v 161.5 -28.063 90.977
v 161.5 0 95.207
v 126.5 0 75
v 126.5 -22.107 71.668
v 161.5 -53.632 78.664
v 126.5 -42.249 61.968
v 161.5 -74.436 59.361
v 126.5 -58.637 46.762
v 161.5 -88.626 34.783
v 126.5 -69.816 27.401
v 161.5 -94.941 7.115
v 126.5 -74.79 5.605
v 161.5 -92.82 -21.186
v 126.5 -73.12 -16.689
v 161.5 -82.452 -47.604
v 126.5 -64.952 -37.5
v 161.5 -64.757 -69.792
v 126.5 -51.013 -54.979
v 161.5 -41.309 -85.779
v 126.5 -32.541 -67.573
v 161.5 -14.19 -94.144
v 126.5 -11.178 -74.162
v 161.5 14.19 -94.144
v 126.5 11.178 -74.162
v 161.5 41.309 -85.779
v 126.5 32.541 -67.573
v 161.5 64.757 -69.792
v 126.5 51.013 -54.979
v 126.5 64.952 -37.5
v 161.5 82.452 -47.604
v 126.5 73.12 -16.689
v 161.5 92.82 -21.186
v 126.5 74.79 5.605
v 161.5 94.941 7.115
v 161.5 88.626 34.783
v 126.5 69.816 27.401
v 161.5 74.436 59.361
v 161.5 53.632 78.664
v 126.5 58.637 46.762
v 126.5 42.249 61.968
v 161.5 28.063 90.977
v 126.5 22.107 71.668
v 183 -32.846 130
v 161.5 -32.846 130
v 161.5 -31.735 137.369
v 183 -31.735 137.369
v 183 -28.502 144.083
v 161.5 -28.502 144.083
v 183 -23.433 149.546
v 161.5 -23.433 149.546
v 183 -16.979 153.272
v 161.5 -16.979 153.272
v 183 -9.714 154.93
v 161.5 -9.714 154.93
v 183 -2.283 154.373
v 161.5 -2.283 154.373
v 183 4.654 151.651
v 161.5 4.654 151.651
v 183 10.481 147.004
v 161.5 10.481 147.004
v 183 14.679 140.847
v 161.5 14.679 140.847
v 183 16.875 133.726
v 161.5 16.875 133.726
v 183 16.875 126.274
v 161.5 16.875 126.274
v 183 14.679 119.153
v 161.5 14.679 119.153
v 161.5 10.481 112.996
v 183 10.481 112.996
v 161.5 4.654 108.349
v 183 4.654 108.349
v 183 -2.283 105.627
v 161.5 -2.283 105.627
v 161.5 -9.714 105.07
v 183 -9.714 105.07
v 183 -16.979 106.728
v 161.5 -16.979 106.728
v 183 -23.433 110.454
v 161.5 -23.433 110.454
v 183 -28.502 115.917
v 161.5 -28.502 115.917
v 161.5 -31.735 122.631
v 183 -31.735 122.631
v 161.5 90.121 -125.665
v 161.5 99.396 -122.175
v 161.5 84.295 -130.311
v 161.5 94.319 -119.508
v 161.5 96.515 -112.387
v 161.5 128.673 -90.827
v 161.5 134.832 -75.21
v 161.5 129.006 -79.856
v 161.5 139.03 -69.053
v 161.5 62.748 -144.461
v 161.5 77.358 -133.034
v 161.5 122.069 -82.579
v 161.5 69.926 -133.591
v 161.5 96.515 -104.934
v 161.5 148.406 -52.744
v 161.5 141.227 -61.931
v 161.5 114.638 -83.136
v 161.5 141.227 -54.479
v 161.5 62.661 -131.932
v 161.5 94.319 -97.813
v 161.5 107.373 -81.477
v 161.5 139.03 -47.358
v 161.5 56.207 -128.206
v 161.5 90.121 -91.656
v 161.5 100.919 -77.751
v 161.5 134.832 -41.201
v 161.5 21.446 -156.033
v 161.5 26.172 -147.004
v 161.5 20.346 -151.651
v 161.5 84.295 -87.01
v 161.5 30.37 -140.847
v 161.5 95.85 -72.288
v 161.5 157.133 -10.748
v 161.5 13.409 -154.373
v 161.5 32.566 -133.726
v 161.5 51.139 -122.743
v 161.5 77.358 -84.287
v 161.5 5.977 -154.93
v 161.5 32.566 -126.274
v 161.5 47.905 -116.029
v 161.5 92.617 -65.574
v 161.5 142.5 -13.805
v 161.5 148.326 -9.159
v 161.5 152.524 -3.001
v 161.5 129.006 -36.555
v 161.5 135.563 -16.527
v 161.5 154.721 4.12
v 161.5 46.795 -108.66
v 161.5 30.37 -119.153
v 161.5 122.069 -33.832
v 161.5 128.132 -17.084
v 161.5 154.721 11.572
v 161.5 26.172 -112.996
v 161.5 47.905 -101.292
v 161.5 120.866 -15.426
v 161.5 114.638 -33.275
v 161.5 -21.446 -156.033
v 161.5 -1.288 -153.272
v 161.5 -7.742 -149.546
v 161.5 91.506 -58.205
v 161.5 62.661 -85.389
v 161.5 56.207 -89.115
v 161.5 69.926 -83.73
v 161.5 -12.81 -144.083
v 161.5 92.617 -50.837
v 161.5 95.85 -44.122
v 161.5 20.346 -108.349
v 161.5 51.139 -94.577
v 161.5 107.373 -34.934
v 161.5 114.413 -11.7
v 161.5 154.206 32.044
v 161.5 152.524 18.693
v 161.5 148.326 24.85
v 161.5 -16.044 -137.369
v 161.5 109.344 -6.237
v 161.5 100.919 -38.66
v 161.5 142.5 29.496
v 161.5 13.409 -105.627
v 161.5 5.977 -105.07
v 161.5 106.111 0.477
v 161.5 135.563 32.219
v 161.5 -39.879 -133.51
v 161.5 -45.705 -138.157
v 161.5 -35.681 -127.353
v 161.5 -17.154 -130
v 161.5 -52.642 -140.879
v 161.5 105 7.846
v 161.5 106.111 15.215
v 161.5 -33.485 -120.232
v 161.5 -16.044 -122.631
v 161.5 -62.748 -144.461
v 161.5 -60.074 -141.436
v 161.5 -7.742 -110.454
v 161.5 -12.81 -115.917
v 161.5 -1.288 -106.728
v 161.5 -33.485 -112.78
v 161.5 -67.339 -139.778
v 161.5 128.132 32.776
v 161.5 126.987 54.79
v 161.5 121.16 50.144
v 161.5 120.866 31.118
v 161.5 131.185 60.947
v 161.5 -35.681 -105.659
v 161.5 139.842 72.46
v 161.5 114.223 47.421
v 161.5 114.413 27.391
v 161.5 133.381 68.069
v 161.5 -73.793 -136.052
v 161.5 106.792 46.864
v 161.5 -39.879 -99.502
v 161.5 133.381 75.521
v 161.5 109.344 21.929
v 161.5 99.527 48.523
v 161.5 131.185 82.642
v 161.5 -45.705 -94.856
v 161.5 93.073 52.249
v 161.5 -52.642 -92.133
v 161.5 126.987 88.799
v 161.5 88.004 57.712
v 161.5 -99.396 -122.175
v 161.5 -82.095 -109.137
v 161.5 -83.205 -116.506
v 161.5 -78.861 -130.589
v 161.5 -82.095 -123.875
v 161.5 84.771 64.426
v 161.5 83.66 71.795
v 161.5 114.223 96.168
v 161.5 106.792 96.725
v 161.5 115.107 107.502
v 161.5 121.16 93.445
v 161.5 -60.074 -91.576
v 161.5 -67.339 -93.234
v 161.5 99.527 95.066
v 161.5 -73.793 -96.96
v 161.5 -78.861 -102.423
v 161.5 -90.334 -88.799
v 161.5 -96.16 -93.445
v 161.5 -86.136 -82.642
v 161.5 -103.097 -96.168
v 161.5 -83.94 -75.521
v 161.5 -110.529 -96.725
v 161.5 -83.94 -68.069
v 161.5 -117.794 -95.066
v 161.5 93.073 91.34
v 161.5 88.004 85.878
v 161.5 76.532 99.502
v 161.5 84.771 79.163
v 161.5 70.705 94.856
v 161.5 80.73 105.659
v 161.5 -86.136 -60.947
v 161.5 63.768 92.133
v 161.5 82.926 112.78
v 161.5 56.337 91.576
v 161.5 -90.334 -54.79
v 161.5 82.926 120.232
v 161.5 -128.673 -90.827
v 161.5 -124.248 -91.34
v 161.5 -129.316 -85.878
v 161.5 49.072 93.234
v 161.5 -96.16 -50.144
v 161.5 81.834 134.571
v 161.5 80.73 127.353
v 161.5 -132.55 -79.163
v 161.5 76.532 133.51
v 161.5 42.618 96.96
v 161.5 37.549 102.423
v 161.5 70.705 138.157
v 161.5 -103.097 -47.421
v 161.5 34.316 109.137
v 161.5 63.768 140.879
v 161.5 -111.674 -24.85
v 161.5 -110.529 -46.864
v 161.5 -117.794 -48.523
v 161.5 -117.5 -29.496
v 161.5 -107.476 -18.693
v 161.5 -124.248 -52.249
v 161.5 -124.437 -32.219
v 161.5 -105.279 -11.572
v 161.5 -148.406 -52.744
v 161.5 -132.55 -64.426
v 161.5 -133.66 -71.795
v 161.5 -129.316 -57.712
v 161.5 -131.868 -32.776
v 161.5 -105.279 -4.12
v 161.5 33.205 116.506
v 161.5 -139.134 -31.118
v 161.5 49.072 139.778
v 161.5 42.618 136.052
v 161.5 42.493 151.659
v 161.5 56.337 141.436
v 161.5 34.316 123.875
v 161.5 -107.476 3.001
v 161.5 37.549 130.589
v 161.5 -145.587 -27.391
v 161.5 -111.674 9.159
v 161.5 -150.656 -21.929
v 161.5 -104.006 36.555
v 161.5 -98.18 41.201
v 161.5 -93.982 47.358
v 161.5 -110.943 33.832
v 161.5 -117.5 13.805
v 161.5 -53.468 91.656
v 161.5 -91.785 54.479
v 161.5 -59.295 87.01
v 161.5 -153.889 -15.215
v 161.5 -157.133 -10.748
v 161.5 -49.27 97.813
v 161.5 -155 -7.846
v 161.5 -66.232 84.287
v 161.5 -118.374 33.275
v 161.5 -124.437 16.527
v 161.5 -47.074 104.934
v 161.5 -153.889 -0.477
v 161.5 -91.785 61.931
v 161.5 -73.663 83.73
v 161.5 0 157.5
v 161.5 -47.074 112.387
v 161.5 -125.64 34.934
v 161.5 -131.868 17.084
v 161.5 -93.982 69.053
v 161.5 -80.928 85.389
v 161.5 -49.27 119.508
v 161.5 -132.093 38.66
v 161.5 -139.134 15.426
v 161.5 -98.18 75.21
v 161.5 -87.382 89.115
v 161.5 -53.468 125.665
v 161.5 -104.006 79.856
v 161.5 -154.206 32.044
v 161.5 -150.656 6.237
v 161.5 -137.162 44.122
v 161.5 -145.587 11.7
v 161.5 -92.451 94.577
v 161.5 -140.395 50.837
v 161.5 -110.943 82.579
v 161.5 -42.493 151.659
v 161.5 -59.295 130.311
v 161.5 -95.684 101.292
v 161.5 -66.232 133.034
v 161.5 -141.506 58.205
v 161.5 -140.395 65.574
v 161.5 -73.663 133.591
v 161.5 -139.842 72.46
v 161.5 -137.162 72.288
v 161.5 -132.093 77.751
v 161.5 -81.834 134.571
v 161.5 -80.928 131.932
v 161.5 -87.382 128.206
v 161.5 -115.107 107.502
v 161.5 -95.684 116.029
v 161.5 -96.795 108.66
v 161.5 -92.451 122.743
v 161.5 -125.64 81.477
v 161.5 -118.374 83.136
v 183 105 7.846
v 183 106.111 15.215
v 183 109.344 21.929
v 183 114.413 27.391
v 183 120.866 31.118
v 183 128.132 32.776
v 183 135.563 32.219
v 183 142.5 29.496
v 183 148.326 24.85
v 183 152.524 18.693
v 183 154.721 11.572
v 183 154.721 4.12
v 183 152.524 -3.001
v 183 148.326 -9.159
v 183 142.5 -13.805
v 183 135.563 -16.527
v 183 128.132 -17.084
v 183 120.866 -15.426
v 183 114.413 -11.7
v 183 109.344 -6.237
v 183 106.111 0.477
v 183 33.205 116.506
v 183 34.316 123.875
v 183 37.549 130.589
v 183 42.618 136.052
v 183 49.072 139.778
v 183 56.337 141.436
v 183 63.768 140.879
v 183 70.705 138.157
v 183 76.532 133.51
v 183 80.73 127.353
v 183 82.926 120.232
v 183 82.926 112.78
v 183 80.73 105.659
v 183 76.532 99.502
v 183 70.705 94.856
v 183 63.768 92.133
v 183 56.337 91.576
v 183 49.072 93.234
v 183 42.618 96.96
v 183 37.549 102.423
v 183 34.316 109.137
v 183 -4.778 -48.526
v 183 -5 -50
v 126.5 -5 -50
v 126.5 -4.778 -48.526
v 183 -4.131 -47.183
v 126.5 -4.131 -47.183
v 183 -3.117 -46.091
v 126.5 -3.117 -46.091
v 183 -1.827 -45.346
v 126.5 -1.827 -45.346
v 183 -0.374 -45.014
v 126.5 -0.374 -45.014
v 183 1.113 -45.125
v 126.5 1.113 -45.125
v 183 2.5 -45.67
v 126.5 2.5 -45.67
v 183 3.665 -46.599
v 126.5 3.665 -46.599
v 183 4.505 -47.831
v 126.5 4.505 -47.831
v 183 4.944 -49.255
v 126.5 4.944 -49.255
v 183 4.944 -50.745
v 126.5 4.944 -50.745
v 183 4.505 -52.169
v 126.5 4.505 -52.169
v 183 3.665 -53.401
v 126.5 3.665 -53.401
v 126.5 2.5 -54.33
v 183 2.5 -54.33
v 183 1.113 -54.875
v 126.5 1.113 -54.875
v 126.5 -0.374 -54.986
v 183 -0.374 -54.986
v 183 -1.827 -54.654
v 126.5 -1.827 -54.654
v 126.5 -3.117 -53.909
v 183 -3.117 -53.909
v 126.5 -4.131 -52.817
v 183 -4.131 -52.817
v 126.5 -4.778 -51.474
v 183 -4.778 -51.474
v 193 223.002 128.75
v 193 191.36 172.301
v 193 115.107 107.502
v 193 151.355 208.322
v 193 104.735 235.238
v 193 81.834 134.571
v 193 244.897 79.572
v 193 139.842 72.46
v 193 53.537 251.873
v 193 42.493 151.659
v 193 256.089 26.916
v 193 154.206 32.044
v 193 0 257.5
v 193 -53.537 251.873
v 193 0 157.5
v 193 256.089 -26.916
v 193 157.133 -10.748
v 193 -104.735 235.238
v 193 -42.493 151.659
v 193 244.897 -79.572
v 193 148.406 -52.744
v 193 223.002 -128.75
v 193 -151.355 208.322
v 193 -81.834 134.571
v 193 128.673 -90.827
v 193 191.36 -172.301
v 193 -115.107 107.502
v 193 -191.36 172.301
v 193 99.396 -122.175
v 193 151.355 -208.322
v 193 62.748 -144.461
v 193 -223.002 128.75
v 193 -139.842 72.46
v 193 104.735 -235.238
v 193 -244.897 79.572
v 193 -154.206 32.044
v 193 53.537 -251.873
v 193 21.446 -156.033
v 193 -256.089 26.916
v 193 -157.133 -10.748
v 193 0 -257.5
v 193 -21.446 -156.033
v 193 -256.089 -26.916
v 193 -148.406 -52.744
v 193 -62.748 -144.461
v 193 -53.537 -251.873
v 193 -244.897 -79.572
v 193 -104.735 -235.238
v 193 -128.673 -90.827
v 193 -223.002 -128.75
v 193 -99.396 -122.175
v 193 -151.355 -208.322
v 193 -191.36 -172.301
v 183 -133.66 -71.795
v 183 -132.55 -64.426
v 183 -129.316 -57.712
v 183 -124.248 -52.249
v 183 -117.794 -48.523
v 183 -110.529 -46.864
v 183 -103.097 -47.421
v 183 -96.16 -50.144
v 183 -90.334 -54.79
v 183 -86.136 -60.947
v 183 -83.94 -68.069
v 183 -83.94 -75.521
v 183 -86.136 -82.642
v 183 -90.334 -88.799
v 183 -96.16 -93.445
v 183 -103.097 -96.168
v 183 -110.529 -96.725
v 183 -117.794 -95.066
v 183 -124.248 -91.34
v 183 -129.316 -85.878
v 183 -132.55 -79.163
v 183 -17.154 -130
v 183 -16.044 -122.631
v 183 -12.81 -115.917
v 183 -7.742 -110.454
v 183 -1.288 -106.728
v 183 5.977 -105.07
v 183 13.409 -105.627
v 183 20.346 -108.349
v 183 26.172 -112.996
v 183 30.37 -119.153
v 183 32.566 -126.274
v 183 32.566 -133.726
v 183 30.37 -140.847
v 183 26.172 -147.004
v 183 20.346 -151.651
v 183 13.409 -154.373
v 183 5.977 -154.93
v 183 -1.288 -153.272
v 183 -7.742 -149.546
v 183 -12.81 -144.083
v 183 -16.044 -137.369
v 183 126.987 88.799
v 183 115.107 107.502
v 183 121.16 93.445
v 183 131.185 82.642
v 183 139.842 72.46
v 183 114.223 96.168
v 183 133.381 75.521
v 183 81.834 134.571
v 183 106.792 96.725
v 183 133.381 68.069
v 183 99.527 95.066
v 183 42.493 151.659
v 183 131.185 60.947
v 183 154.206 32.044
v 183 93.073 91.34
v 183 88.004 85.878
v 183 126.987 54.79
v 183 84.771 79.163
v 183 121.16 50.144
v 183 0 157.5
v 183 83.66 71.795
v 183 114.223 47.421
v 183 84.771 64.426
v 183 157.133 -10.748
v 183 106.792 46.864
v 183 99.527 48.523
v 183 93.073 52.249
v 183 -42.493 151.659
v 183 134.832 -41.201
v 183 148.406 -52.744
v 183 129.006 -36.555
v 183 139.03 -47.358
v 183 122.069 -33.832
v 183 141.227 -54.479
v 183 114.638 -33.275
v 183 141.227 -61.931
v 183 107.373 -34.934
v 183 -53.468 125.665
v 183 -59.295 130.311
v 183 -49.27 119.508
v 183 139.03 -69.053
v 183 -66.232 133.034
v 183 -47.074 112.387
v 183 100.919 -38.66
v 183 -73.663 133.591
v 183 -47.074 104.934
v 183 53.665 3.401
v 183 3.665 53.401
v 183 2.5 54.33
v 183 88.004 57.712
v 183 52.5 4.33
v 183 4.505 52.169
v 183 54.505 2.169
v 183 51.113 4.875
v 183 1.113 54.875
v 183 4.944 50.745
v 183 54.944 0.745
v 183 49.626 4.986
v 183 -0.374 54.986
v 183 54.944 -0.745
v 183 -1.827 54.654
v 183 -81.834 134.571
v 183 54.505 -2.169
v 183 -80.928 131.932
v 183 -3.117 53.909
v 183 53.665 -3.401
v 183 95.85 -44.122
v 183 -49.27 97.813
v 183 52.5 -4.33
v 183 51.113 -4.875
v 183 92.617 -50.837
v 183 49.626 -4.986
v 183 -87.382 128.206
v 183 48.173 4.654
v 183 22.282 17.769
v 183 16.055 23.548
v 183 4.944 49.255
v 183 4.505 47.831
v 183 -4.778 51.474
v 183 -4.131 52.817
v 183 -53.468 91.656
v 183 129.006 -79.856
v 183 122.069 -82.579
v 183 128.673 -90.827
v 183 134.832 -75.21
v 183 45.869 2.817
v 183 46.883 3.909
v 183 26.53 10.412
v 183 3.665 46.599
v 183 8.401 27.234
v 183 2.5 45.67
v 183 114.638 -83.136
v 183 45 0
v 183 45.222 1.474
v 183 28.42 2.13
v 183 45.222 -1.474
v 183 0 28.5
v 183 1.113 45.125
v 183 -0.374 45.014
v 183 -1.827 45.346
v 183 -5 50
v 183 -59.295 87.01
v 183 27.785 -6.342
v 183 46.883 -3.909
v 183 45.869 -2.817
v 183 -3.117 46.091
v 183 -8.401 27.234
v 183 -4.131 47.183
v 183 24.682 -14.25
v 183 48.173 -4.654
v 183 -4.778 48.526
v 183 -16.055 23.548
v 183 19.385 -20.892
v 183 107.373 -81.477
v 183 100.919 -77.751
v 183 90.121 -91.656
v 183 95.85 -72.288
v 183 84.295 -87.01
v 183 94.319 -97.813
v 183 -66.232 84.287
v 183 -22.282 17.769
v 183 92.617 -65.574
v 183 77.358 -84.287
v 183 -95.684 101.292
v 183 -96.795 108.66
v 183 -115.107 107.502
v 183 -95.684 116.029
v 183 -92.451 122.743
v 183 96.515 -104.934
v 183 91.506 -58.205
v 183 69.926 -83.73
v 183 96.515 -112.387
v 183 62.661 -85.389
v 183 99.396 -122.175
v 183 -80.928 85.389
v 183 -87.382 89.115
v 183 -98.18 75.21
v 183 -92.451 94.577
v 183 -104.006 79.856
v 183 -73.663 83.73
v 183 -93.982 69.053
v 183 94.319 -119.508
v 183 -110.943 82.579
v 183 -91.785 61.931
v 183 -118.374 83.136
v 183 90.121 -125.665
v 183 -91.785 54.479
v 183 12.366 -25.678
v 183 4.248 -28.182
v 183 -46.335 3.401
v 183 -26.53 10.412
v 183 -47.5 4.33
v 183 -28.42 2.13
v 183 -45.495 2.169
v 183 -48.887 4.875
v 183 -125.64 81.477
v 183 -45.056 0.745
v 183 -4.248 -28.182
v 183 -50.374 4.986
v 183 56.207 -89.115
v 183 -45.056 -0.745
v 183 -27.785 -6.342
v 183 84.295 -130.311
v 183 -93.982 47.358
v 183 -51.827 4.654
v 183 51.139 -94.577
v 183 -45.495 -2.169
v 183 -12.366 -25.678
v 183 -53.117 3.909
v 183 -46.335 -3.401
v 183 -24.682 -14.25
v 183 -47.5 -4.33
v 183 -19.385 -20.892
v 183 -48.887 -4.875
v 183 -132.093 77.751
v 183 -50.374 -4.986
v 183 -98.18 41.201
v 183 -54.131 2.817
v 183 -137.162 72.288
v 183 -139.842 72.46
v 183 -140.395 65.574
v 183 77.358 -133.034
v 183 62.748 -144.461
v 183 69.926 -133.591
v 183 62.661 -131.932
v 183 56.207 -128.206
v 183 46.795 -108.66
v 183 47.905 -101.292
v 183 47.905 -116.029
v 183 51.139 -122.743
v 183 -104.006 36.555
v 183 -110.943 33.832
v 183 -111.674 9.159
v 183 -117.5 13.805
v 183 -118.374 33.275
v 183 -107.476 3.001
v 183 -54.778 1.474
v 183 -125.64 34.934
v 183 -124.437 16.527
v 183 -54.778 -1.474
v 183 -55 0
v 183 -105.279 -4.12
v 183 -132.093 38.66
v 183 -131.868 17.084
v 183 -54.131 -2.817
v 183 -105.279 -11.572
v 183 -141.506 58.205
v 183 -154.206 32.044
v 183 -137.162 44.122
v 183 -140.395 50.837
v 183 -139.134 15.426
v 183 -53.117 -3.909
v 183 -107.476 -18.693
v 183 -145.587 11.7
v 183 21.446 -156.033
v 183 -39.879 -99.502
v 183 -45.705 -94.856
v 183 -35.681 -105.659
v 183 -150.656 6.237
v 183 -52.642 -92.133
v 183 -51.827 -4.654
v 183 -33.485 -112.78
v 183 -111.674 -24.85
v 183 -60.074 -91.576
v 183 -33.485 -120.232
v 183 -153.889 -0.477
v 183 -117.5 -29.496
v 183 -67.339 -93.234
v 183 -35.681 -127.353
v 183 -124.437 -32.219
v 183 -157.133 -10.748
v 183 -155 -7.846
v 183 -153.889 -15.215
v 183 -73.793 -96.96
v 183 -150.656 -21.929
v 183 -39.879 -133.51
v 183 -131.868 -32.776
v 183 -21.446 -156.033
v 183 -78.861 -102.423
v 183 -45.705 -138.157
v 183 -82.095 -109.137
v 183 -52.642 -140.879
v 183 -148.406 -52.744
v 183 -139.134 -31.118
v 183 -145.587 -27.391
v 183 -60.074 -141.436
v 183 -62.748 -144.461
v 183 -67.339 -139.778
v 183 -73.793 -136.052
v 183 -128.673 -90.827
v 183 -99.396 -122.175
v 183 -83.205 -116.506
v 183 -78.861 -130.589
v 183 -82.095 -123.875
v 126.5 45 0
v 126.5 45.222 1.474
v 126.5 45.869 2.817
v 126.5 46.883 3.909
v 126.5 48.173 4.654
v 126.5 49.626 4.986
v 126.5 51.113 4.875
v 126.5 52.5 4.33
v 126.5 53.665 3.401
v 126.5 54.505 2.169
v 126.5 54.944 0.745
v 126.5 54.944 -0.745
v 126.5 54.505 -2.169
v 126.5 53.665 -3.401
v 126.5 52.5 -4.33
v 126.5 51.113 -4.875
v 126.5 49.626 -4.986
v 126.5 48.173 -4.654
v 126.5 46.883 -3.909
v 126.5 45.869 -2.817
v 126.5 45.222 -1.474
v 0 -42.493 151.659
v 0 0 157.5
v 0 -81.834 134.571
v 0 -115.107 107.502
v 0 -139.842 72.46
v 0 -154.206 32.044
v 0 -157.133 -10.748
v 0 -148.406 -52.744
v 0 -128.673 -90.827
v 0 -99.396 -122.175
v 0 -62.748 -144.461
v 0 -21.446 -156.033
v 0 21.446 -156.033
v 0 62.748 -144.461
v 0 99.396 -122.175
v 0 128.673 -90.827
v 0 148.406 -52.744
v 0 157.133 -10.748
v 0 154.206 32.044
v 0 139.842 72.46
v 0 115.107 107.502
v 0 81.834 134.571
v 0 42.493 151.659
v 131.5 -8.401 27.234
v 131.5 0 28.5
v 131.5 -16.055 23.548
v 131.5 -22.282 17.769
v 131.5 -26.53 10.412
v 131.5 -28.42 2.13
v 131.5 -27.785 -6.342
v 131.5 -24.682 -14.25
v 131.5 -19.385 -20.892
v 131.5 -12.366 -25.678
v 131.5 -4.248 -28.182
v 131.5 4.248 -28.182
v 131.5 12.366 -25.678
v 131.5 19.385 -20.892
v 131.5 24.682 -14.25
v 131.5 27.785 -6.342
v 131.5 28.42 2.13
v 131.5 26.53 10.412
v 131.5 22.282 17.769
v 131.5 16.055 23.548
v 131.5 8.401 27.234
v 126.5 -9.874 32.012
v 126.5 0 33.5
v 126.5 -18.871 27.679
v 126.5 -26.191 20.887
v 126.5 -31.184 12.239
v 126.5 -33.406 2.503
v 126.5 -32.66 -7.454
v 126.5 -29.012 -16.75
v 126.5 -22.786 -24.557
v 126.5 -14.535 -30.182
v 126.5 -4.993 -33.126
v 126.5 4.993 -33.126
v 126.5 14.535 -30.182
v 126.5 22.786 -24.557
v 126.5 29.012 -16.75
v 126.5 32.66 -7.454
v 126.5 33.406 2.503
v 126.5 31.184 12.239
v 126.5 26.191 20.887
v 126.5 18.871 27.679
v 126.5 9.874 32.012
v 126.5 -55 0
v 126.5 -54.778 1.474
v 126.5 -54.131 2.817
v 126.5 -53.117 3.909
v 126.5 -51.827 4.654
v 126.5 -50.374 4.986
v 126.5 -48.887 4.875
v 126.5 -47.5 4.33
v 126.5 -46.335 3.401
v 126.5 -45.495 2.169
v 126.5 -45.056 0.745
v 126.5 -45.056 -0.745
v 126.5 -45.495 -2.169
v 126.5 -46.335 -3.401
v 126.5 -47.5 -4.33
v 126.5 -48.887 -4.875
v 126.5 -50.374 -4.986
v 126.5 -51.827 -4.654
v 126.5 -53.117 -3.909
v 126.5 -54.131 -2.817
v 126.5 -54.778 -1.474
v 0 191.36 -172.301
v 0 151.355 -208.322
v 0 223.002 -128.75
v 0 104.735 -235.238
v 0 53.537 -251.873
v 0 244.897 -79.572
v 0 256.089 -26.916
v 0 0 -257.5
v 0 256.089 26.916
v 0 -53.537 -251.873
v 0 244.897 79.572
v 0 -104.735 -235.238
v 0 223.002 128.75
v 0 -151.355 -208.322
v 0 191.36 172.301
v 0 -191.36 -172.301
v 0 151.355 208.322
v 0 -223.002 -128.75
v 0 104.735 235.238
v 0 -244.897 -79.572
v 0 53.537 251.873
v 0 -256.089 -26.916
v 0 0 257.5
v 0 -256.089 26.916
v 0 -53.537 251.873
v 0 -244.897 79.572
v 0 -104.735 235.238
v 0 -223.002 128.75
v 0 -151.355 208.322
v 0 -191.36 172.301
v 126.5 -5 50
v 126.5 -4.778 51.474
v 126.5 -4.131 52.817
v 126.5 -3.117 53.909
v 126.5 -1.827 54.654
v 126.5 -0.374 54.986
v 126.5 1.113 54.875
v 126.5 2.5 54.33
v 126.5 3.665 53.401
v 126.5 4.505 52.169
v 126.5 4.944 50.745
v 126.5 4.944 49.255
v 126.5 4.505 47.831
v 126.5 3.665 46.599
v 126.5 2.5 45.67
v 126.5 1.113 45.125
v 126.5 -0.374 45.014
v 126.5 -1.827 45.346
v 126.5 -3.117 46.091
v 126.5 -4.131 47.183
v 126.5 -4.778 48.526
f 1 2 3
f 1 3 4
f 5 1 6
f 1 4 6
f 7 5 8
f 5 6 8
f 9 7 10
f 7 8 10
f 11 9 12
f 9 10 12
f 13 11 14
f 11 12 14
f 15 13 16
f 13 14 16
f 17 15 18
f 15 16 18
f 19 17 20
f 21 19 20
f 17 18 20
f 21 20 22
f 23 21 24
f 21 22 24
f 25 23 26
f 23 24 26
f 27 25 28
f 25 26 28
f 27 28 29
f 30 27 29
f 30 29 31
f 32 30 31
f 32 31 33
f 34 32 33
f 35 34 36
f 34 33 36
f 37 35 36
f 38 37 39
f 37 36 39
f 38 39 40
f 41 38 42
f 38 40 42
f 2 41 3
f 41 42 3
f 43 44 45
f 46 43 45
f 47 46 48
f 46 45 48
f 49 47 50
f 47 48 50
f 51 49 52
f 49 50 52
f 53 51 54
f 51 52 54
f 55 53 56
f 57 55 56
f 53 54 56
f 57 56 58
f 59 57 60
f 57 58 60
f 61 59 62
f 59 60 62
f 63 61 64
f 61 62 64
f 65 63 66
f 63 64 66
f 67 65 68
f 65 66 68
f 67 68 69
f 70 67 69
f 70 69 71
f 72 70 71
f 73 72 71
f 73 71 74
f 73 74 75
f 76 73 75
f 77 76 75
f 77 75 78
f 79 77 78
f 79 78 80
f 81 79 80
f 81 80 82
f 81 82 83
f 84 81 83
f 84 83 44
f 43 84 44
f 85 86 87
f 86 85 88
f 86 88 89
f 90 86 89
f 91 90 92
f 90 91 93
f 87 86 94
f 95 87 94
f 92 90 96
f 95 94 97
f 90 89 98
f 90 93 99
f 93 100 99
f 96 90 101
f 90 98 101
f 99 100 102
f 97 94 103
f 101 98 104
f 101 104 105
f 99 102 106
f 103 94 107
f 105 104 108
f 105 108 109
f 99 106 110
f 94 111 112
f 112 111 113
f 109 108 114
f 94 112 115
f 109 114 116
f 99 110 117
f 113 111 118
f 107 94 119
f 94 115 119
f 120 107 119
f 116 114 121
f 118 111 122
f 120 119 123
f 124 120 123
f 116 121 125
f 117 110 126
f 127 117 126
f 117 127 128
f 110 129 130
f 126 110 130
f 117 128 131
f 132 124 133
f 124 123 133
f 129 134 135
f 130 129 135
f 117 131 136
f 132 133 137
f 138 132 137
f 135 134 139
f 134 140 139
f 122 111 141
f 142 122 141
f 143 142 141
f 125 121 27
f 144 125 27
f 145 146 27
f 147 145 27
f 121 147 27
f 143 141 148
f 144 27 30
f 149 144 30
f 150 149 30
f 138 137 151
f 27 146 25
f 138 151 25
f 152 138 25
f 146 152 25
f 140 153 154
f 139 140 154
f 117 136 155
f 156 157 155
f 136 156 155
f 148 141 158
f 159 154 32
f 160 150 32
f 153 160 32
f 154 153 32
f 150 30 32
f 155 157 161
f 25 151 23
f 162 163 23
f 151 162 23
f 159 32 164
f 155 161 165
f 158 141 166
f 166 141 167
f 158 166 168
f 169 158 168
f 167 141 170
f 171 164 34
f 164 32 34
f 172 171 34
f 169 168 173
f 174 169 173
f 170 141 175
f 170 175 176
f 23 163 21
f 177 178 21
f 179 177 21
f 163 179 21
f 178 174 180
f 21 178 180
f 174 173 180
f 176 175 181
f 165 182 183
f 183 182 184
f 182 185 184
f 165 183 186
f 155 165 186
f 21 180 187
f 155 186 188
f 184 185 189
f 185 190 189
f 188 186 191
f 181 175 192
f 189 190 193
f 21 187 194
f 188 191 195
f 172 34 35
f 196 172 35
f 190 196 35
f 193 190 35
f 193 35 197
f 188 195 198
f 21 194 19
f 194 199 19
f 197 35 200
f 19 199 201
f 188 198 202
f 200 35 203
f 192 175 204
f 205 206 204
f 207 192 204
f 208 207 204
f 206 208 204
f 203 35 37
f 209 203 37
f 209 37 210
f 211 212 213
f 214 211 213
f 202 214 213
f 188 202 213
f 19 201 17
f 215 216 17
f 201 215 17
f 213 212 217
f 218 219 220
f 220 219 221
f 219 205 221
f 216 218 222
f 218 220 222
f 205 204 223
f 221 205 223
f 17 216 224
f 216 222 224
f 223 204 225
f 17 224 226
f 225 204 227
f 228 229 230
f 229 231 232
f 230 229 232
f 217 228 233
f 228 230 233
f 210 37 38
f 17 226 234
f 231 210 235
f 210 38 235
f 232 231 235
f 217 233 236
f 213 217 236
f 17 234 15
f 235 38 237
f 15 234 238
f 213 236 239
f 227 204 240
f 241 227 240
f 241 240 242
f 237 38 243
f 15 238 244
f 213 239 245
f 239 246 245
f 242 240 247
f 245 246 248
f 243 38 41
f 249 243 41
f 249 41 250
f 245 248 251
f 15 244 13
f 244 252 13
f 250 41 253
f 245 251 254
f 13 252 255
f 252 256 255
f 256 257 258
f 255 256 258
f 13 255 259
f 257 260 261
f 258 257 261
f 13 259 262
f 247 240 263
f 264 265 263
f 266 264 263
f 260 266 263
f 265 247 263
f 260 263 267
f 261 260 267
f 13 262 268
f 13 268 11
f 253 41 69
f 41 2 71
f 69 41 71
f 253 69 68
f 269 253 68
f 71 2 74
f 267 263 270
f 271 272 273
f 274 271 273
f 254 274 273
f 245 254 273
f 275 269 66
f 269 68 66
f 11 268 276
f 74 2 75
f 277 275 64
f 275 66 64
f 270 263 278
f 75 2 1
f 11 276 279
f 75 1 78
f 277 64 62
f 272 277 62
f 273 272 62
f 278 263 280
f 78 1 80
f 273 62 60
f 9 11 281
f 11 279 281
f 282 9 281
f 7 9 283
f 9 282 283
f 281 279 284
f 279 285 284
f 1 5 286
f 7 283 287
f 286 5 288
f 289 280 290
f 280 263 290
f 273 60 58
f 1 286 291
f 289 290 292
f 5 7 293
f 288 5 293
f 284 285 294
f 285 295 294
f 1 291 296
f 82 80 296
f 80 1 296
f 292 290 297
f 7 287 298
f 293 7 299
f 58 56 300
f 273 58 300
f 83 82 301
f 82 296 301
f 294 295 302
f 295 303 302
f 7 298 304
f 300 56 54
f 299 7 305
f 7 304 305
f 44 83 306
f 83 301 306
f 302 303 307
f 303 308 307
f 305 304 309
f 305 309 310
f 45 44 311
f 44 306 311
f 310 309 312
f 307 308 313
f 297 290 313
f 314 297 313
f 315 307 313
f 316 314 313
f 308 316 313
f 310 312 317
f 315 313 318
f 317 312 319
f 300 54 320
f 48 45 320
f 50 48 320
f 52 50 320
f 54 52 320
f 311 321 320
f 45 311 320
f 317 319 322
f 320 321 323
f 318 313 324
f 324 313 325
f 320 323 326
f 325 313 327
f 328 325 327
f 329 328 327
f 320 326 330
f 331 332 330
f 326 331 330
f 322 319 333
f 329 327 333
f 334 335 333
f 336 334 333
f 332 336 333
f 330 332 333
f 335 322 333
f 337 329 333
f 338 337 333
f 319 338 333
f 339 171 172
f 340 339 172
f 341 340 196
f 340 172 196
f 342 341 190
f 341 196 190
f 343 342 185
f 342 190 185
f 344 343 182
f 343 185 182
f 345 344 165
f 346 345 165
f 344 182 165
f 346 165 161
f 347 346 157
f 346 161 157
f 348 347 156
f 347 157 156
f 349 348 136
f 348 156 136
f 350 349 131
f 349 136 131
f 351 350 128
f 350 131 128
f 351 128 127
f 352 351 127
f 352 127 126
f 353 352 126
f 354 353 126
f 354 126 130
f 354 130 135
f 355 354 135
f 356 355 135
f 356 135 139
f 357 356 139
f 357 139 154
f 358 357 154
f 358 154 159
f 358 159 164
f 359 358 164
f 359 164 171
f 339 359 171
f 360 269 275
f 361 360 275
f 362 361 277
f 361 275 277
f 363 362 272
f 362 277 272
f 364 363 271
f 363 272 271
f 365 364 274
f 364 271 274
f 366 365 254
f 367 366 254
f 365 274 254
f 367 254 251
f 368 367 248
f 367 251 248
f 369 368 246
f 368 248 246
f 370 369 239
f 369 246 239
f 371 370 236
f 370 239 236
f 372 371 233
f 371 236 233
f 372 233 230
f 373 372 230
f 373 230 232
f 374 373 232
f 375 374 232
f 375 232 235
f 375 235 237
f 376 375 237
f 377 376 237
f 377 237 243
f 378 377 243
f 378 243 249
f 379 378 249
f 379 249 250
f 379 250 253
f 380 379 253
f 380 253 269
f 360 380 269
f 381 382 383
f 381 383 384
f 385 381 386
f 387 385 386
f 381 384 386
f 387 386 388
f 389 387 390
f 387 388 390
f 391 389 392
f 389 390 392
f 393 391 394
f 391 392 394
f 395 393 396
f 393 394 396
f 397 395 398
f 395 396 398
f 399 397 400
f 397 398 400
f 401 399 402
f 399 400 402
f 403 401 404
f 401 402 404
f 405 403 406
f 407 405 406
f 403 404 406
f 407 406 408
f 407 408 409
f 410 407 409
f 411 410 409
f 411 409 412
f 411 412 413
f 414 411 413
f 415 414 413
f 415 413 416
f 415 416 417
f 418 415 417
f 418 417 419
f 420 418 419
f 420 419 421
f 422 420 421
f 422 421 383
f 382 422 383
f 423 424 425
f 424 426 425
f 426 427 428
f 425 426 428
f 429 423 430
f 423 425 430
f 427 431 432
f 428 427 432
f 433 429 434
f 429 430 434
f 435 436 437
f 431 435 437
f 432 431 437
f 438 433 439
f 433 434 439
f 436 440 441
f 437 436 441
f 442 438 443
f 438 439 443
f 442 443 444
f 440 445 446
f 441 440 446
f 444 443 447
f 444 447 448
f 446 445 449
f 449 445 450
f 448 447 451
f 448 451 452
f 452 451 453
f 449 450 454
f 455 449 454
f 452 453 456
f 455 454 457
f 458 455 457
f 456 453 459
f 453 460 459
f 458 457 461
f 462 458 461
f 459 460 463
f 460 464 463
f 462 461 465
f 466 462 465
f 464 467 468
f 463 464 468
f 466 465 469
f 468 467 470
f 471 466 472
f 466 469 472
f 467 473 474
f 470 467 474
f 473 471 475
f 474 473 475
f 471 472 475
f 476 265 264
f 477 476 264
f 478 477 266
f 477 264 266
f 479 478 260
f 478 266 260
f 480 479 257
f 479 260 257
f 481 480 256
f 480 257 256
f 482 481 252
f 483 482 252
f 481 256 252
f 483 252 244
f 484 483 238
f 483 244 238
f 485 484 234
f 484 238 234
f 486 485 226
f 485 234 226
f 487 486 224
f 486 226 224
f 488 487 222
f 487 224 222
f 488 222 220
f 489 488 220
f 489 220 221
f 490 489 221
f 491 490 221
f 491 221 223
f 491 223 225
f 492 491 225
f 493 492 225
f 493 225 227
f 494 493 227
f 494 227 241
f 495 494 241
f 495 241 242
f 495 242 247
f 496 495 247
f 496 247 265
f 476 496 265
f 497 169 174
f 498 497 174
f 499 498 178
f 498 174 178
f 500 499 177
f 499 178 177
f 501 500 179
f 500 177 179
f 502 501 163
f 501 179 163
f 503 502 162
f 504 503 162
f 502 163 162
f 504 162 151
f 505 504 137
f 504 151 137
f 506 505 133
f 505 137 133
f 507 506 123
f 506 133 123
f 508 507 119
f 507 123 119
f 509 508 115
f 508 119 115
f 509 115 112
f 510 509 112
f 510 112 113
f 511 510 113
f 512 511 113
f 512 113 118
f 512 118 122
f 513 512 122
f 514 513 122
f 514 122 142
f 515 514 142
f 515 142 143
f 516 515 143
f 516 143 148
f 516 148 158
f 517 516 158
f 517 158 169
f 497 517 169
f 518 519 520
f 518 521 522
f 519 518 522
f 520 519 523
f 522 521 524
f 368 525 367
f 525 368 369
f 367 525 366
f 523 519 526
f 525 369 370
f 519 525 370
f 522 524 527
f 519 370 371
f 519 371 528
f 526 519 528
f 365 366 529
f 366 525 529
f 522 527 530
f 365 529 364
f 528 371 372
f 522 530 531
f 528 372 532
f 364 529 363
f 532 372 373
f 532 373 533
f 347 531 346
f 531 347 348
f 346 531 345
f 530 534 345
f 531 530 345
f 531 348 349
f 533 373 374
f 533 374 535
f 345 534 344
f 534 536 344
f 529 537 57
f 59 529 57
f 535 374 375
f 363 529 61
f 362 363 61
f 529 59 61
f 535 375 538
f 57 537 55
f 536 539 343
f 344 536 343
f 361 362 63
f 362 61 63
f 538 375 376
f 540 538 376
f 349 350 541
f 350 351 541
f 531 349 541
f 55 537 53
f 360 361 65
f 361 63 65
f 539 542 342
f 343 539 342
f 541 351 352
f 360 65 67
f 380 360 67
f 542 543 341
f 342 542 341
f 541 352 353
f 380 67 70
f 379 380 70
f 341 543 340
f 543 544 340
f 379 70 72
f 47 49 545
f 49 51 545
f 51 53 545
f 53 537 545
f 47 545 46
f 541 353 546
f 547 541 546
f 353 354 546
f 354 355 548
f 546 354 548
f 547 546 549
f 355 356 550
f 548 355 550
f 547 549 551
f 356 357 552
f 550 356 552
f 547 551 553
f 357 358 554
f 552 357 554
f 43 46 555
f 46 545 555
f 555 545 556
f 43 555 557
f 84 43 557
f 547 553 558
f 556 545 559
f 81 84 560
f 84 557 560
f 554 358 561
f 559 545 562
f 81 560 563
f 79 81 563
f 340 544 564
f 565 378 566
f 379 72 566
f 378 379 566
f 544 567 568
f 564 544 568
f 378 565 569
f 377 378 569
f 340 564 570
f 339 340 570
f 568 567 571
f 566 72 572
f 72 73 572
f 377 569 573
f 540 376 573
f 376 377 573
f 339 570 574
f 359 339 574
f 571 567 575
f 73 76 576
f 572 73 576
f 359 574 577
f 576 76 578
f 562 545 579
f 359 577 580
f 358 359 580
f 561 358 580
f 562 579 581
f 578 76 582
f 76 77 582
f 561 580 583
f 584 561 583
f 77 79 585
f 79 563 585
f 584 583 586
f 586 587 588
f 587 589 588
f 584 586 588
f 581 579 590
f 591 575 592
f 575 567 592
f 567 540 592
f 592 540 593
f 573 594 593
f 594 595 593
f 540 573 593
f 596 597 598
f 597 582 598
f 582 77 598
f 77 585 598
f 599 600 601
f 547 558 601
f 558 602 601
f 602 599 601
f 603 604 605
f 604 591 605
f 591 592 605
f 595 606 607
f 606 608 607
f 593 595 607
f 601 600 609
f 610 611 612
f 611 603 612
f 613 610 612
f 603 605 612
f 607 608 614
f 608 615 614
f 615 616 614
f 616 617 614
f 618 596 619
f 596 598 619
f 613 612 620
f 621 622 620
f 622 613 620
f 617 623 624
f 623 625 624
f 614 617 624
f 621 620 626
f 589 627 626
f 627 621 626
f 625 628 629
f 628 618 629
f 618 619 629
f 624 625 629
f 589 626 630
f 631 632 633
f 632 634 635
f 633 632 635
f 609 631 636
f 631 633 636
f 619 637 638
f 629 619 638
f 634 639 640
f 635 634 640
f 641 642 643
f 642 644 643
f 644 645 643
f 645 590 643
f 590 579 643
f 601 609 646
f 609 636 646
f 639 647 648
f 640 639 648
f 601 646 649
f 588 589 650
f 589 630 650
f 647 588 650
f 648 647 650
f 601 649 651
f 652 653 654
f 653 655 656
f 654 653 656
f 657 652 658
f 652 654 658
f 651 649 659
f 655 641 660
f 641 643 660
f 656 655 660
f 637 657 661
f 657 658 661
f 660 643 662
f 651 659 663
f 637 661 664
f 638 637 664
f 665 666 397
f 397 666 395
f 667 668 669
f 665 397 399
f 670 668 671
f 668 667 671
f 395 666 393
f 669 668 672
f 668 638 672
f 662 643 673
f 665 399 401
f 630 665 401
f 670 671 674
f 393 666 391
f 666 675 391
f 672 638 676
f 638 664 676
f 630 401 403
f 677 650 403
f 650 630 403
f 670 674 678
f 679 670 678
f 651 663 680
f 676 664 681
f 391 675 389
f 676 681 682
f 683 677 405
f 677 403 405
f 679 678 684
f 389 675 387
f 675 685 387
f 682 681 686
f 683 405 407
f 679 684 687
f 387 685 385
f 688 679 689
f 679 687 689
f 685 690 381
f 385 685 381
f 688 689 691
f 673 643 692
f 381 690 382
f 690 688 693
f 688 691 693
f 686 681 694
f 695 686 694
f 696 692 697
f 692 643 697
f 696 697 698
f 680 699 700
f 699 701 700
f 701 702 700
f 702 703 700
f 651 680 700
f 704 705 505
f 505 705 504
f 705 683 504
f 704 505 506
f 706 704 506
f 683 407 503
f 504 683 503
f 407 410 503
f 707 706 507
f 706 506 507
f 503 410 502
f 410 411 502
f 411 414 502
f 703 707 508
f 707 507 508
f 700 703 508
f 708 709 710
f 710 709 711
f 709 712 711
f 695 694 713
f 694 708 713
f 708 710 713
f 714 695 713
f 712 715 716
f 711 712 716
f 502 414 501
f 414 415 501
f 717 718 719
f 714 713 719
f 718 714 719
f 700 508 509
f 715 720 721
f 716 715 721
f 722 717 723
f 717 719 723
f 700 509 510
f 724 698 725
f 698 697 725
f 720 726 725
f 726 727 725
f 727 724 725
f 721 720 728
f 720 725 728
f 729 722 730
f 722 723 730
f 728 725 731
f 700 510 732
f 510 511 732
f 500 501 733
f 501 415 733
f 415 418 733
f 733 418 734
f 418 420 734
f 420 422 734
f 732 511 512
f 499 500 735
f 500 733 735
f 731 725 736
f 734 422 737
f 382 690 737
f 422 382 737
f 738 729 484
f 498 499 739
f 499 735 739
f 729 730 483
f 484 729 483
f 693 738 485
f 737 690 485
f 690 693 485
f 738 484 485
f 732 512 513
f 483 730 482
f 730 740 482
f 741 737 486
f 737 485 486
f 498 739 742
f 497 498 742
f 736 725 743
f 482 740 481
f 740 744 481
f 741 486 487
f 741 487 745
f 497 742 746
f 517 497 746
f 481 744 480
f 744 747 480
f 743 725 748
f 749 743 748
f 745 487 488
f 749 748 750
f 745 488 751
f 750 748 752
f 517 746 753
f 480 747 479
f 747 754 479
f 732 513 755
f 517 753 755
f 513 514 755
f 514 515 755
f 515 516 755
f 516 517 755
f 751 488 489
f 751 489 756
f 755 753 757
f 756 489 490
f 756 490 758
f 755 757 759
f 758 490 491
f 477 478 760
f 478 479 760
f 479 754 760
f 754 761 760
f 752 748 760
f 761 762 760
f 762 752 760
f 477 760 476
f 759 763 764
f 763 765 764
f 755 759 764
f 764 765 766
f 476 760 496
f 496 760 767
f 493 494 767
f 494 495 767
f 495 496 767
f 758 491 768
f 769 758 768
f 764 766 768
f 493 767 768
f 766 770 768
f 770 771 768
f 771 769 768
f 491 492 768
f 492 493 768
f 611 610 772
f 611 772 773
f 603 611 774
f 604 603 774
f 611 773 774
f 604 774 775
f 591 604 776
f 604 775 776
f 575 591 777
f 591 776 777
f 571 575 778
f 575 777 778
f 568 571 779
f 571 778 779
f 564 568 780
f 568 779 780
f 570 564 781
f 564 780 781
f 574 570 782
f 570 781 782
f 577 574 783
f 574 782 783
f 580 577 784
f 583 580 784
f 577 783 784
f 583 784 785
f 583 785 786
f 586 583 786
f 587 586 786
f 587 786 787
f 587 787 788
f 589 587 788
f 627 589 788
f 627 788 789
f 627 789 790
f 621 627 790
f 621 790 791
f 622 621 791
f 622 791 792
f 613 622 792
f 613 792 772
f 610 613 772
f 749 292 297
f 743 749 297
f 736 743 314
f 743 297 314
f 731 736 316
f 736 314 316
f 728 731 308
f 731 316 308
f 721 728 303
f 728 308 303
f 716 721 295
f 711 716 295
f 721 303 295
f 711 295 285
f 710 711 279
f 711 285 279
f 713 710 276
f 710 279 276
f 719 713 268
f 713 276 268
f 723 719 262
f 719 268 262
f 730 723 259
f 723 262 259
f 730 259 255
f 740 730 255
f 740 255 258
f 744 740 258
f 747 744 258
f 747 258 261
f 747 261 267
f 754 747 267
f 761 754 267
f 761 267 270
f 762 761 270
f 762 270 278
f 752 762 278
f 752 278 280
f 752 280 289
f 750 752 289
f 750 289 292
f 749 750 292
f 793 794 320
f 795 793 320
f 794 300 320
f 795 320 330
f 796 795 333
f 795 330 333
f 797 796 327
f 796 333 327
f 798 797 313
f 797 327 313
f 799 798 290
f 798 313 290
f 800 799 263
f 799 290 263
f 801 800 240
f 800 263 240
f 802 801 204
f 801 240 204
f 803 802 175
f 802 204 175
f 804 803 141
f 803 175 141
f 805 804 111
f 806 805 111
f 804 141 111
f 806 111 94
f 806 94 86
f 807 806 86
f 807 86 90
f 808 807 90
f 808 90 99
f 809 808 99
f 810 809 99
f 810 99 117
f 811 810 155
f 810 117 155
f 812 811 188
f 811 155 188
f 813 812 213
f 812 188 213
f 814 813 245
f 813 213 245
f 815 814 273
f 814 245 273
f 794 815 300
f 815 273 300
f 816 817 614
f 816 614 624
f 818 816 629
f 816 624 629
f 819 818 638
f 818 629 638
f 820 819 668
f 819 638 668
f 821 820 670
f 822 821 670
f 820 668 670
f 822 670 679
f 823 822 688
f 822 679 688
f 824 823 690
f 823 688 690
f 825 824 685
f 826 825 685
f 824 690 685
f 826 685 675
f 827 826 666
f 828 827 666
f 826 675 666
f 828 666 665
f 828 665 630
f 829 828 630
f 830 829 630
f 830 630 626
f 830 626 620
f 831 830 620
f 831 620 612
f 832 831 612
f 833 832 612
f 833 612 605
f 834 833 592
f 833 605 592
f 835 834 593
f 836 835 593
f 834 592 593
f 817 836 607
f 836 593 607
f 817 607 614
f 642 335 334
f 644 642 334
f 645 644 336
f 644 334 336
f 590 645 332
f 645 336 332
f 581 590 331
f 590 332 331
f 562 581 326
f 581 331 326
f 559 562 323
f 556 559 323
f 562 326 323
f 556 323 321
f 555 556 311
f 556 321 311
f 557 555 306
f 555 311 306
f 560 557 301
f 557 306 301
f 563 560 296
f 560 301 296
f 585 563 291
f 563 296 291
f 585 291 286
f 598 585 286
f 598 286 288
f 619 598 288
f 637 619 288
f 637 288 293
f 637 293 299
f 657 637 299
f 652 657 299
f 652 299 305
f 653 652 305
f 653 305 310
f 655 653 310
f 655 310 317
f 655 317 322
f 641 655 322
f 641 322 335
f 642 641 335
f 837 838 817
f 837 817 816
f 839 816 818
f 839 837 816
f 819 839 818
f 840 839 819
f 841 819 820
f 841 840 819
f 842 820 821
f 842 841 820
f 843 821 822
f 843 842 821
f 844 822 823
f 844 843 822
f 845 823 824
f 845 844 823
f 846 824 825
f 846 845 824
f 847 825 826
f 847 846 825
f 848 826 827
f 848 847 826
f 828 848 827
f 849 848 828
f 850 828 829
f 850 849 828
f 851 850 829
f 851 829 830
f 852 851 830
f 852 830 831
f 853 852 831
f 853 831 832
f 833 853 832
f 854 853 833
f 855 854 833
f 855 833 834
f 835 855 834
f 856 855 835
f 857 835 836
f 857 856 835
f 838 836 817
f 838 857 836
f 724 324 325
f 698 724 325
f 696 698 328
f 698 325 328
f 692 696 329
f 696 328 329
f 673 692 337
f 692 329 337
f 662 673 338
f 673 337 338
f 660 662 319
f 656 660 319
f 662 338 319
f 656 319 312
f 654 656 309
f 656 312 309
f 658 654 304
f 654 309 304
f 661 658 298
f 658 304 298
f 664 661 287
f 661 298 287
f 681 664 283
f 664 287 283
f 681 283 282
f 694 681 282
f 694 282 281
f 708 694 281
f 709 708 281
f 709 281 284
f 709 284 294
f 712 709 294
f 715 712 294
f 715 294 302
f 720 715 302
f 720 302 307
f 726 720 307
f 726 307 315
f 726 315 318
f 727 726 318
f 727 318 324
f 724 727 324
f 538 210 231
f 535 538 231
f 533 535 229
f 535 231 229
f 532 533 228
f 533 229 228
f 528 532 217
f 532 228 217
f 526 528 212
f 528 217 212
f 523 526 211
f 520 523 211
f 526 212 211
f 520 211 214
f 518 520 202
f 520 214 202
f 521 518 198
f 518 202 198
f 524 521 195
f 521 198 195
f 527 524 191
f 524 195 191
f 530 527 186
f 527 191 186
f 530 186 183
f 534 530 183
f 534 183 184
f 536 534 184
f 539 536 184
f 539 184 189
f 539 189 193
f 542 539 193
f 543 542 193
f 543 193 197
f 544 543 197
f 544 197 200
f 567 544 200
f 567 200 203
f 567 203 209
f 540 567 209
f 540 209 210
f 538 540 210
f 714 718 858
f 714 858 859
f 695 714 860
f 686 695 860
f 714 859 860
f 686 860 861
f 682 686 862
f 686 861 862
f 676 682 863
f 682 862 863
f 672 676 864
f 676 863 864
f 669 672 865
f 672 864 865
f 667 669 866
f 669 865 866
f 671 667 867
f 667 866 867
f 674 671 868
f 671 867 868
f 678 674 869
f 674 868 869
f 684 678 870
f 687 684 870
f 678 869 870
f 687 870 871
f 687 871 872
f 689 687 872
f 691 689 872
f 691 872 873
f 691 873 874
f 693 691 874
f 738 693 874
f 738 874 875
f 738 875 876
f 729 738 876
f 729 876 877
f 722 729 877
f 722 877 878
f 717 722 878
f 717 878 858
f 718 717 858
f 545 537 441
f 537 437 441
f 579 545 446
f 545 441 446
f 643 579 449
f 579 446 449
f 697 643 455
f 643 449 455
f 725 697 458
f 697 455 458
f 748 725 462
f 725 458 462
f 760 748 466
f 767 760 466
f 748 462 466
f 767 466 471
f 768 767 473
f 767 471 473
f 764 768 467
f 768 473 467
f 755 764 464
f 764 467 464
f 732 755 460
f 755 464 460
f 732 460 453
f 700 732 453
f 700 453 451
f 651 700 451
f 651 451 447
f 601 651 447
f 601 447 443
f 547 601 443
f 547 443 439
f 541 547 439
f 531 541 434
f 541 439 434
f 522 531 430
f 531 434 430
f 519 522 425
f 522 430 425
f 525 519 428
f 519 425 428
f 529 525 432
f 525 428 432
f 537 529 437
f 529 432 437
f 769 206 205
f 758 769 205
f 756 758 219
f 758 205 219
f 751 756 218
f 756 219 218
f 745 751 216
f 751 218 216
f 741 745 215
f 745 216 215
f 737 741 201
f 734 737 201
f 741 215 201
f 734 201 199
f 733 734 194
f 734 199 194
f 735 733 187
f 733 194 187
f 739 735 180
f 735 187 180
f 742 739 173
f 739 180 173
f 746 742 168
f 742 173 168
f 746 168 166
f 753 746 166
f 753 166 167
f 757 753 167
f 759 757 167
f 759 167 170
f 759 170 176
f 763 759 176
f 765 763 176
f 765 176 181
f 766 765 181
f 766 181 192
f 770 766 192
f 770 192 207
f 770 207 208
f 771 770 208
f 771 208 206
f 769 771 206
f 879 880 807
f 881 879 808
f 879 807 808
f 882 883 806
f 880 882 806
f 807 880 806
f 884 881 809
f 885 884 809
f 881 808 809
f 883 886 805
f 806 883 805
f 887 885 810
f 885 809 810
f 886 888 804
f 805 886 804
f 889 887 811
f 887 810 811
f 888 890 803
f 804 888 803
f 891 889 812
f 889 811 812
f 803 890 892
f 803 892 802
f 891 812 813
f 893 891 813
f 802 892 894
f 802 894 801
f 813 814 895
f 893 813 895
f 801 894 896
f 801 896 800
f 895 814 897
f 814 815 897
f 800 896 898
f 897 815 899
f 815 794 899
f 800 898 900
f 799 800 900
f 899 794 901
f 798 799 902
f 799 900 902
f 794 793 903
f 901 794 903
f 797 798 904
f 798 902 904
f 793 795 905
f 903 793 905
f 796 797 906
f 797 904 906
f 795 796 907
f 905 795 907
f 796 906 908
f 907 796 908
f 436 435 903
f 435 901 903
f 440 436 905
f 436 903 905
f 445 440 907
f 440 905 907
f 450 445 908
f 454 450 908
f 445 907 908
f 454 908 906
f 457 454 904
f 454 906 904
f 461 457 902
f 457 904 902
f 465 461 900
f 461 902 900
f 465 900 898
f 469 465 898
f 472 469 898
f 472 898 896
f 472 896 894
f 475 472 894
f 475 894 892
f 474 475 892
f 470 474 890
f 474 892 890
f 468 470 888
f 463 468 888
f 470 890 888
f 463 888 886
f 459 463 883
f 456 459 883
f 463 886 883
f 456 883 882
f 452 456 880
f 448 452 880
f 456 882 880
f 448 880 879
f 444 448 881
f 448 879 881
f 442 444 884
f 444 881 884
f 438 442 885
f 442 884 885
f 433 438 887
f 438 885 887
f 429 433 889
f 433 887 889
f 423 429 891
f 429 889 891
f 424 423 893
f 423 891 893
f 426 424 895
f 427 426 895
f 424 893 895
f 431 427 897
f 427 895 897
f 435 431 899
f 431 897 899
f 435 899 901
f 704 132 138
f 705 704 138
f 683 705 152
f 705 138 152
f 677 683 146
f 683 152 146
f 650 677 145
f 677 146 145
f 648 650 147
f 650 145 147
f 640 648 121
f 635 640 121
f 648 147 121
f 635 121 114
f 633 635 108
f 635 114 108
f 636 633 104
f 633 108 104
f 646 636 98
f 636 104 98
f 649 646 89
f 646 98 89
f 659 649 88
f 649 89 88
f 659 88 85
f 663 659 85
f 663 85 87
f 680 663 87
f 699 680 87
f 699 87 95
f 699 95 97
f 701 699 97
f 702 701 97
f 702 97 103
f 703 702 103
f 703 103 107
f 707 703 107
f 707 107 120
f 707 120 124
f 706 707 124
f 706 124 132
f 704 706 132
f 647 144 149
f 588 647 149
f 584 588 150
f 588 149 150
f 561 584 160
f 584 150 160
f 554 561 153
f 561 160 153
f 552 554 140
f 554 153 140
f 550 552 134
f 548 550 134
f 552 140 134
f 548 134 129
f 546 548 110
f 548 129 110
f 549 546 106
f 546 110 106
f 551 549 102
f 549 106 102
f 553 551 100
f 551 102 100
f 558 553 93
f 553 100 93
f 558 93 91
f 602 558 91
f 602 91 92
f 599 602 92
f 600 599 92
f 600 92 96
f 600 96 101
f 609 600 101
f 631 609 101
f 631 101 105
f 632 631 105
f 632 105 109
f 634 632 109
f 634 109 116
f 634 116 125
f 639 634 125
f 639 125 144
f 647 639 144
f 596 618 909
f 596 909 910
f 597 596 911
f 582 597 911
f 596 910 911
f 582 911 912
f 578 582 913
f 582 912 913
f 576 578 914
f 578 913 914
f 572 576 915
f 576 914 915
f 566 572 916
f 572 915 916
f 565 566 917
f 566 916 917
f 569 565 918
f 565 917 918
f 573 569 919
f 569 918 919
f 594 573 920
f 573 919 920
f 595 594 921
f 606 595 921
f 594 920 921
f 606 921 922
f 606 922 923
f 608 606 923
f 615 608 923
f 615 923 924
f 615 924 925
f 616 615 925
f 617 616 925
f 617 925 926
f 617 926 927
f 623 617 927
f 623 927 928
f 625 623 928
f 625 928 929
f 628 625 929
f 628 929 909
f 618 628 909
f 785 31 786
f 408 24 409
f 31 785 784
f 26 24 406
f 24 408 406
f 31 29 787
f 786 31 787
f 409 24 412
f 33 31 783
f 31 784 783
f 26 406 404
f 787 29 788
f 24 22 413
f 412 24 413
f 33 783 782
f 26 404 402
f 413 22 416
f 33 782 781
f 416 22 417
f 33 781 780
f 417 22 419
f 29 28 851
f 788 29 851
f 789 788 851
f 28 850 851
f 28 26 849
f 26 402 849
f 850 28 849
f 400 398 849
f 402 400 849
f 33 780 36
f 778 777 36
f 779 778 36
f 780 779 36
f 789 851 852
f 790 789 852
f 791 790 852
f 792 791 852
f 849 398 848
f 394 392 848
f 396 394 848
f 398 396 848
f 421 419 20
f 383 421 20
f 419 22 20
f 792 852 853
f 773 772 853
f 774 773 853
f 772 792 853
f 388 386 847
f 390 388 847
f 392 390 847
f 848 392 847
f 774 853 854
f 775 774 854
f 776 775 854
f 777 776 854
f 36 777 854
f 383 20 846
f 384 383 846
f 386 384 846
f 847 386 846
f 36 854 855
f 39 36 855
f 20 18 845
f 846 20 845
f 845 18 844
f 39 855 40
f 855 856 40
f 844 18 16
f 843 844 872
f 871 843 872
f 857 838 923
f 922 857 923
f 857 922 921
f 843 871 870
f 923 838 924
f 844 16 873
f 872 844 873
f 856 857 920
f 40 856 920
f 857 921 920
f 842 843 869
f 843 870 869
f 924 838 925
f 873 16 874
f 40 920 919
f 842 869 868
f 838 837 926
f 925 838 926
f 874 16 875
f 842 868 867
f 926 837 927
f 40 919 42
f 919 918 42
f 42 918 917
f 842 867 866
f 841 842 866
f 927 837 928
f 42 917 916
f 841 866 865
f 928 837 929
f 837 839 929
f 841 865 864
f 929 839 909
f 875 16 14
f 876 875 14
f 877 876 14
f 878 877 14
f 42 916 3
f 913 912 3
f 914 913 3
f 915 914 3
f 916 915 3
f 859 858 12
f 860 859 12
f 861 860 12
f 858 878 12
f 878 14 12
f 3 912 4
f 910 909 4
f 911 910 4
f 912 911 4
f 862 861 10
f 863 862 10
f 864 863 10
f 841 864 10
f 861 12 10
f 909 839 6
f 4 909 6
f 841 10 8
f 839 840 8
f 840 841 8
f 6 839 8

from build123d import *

# Parameters (mm, degrees)
F2_R     = 25
F3_DEPTH = 25
F4_R     = 5
F5_DEPTH = 66.501
F6_SIZE  = 5


with BuildPart() as f1:
    # F0 (on Front) → F1 (revolve)
    with BuildSketch(Plane.XZ):
        Polygon((193, 157.5), (193, 257.5), (0, 257.5), (0, 157.5), (161.5, 157.5), (161.5, 95.207259), (126.5, 75), (126.5, 28.5), (183, 28.5), (183, 157.5), align=None)
    revolve(axis=Axis((48.25, 0, 0), (1, 0, 0)))

    # F2 (on face) → F3 (cut)
    with BuildSketch(Plane(origin=(161.5, 0, 0), x_dir=(0, -1, 0), z_dir=(-1, 0, 0))):
        with Locations((7.845702, 130)):
            Circle(F2_R)
        with Locations((-58.205423, 116.506153)):
            Circle(F2_R)
        with Locations((-108.660452, 71.794577)):
            Circle(F2_R)
        with Locations((-130, 7.845702)):
            Circle(F2_R)
        with Locations((-116.506153, -58.205423)):
            Circle(F2_R)
        with Locations((-71.794577, -108.660452)):
            Circle(F2_R)
        with Locations((-7.845702, -130)):
            Circle(F2_R)
        with Locations((58.205423, -116.506153)):
            Circle(F2_R)
        with Locations((108.660452, -71.794577)):
            Circle(F2_R)
        with Locations((130, -7.845702)):
            Circle(F2_R)
        with Locations((116.506153, 58.205423)):
            Circle(F2_R)
        with Locations((71.794577, 108.660452)):
            Circle(F2_R)
    extrude(amount=-F3_DEPTH, mode=Mode.SUBTRACT)

    # F4 (on face) → F5 (cut, through all)
    with BuildSketch(Plane(origin=(126.5, 0, 0), x_dir=(0, -1, 0), z_dir=(-1, 0, 0))):
        with Locations((0, 50)):
            Circle(F4_R)
        with Locations((-50, 0)):
            Circle(F4_R)
        with Locations((0, -50)):
            Circle(F4_R)
        with Locations((50, 0)):
            Circle(F4_R)
    extrude(amount=-F5_DEPTH, mode=Mode.SUBTRACT)

    # F6
    f6_edges = [f1.edges().sort_by_distance(p)[0] for p in [
        (126.5, 0, -28.5),
    ]]
    chamfer(f6_edges, length=F6_SIZE)


solid = f1.part
